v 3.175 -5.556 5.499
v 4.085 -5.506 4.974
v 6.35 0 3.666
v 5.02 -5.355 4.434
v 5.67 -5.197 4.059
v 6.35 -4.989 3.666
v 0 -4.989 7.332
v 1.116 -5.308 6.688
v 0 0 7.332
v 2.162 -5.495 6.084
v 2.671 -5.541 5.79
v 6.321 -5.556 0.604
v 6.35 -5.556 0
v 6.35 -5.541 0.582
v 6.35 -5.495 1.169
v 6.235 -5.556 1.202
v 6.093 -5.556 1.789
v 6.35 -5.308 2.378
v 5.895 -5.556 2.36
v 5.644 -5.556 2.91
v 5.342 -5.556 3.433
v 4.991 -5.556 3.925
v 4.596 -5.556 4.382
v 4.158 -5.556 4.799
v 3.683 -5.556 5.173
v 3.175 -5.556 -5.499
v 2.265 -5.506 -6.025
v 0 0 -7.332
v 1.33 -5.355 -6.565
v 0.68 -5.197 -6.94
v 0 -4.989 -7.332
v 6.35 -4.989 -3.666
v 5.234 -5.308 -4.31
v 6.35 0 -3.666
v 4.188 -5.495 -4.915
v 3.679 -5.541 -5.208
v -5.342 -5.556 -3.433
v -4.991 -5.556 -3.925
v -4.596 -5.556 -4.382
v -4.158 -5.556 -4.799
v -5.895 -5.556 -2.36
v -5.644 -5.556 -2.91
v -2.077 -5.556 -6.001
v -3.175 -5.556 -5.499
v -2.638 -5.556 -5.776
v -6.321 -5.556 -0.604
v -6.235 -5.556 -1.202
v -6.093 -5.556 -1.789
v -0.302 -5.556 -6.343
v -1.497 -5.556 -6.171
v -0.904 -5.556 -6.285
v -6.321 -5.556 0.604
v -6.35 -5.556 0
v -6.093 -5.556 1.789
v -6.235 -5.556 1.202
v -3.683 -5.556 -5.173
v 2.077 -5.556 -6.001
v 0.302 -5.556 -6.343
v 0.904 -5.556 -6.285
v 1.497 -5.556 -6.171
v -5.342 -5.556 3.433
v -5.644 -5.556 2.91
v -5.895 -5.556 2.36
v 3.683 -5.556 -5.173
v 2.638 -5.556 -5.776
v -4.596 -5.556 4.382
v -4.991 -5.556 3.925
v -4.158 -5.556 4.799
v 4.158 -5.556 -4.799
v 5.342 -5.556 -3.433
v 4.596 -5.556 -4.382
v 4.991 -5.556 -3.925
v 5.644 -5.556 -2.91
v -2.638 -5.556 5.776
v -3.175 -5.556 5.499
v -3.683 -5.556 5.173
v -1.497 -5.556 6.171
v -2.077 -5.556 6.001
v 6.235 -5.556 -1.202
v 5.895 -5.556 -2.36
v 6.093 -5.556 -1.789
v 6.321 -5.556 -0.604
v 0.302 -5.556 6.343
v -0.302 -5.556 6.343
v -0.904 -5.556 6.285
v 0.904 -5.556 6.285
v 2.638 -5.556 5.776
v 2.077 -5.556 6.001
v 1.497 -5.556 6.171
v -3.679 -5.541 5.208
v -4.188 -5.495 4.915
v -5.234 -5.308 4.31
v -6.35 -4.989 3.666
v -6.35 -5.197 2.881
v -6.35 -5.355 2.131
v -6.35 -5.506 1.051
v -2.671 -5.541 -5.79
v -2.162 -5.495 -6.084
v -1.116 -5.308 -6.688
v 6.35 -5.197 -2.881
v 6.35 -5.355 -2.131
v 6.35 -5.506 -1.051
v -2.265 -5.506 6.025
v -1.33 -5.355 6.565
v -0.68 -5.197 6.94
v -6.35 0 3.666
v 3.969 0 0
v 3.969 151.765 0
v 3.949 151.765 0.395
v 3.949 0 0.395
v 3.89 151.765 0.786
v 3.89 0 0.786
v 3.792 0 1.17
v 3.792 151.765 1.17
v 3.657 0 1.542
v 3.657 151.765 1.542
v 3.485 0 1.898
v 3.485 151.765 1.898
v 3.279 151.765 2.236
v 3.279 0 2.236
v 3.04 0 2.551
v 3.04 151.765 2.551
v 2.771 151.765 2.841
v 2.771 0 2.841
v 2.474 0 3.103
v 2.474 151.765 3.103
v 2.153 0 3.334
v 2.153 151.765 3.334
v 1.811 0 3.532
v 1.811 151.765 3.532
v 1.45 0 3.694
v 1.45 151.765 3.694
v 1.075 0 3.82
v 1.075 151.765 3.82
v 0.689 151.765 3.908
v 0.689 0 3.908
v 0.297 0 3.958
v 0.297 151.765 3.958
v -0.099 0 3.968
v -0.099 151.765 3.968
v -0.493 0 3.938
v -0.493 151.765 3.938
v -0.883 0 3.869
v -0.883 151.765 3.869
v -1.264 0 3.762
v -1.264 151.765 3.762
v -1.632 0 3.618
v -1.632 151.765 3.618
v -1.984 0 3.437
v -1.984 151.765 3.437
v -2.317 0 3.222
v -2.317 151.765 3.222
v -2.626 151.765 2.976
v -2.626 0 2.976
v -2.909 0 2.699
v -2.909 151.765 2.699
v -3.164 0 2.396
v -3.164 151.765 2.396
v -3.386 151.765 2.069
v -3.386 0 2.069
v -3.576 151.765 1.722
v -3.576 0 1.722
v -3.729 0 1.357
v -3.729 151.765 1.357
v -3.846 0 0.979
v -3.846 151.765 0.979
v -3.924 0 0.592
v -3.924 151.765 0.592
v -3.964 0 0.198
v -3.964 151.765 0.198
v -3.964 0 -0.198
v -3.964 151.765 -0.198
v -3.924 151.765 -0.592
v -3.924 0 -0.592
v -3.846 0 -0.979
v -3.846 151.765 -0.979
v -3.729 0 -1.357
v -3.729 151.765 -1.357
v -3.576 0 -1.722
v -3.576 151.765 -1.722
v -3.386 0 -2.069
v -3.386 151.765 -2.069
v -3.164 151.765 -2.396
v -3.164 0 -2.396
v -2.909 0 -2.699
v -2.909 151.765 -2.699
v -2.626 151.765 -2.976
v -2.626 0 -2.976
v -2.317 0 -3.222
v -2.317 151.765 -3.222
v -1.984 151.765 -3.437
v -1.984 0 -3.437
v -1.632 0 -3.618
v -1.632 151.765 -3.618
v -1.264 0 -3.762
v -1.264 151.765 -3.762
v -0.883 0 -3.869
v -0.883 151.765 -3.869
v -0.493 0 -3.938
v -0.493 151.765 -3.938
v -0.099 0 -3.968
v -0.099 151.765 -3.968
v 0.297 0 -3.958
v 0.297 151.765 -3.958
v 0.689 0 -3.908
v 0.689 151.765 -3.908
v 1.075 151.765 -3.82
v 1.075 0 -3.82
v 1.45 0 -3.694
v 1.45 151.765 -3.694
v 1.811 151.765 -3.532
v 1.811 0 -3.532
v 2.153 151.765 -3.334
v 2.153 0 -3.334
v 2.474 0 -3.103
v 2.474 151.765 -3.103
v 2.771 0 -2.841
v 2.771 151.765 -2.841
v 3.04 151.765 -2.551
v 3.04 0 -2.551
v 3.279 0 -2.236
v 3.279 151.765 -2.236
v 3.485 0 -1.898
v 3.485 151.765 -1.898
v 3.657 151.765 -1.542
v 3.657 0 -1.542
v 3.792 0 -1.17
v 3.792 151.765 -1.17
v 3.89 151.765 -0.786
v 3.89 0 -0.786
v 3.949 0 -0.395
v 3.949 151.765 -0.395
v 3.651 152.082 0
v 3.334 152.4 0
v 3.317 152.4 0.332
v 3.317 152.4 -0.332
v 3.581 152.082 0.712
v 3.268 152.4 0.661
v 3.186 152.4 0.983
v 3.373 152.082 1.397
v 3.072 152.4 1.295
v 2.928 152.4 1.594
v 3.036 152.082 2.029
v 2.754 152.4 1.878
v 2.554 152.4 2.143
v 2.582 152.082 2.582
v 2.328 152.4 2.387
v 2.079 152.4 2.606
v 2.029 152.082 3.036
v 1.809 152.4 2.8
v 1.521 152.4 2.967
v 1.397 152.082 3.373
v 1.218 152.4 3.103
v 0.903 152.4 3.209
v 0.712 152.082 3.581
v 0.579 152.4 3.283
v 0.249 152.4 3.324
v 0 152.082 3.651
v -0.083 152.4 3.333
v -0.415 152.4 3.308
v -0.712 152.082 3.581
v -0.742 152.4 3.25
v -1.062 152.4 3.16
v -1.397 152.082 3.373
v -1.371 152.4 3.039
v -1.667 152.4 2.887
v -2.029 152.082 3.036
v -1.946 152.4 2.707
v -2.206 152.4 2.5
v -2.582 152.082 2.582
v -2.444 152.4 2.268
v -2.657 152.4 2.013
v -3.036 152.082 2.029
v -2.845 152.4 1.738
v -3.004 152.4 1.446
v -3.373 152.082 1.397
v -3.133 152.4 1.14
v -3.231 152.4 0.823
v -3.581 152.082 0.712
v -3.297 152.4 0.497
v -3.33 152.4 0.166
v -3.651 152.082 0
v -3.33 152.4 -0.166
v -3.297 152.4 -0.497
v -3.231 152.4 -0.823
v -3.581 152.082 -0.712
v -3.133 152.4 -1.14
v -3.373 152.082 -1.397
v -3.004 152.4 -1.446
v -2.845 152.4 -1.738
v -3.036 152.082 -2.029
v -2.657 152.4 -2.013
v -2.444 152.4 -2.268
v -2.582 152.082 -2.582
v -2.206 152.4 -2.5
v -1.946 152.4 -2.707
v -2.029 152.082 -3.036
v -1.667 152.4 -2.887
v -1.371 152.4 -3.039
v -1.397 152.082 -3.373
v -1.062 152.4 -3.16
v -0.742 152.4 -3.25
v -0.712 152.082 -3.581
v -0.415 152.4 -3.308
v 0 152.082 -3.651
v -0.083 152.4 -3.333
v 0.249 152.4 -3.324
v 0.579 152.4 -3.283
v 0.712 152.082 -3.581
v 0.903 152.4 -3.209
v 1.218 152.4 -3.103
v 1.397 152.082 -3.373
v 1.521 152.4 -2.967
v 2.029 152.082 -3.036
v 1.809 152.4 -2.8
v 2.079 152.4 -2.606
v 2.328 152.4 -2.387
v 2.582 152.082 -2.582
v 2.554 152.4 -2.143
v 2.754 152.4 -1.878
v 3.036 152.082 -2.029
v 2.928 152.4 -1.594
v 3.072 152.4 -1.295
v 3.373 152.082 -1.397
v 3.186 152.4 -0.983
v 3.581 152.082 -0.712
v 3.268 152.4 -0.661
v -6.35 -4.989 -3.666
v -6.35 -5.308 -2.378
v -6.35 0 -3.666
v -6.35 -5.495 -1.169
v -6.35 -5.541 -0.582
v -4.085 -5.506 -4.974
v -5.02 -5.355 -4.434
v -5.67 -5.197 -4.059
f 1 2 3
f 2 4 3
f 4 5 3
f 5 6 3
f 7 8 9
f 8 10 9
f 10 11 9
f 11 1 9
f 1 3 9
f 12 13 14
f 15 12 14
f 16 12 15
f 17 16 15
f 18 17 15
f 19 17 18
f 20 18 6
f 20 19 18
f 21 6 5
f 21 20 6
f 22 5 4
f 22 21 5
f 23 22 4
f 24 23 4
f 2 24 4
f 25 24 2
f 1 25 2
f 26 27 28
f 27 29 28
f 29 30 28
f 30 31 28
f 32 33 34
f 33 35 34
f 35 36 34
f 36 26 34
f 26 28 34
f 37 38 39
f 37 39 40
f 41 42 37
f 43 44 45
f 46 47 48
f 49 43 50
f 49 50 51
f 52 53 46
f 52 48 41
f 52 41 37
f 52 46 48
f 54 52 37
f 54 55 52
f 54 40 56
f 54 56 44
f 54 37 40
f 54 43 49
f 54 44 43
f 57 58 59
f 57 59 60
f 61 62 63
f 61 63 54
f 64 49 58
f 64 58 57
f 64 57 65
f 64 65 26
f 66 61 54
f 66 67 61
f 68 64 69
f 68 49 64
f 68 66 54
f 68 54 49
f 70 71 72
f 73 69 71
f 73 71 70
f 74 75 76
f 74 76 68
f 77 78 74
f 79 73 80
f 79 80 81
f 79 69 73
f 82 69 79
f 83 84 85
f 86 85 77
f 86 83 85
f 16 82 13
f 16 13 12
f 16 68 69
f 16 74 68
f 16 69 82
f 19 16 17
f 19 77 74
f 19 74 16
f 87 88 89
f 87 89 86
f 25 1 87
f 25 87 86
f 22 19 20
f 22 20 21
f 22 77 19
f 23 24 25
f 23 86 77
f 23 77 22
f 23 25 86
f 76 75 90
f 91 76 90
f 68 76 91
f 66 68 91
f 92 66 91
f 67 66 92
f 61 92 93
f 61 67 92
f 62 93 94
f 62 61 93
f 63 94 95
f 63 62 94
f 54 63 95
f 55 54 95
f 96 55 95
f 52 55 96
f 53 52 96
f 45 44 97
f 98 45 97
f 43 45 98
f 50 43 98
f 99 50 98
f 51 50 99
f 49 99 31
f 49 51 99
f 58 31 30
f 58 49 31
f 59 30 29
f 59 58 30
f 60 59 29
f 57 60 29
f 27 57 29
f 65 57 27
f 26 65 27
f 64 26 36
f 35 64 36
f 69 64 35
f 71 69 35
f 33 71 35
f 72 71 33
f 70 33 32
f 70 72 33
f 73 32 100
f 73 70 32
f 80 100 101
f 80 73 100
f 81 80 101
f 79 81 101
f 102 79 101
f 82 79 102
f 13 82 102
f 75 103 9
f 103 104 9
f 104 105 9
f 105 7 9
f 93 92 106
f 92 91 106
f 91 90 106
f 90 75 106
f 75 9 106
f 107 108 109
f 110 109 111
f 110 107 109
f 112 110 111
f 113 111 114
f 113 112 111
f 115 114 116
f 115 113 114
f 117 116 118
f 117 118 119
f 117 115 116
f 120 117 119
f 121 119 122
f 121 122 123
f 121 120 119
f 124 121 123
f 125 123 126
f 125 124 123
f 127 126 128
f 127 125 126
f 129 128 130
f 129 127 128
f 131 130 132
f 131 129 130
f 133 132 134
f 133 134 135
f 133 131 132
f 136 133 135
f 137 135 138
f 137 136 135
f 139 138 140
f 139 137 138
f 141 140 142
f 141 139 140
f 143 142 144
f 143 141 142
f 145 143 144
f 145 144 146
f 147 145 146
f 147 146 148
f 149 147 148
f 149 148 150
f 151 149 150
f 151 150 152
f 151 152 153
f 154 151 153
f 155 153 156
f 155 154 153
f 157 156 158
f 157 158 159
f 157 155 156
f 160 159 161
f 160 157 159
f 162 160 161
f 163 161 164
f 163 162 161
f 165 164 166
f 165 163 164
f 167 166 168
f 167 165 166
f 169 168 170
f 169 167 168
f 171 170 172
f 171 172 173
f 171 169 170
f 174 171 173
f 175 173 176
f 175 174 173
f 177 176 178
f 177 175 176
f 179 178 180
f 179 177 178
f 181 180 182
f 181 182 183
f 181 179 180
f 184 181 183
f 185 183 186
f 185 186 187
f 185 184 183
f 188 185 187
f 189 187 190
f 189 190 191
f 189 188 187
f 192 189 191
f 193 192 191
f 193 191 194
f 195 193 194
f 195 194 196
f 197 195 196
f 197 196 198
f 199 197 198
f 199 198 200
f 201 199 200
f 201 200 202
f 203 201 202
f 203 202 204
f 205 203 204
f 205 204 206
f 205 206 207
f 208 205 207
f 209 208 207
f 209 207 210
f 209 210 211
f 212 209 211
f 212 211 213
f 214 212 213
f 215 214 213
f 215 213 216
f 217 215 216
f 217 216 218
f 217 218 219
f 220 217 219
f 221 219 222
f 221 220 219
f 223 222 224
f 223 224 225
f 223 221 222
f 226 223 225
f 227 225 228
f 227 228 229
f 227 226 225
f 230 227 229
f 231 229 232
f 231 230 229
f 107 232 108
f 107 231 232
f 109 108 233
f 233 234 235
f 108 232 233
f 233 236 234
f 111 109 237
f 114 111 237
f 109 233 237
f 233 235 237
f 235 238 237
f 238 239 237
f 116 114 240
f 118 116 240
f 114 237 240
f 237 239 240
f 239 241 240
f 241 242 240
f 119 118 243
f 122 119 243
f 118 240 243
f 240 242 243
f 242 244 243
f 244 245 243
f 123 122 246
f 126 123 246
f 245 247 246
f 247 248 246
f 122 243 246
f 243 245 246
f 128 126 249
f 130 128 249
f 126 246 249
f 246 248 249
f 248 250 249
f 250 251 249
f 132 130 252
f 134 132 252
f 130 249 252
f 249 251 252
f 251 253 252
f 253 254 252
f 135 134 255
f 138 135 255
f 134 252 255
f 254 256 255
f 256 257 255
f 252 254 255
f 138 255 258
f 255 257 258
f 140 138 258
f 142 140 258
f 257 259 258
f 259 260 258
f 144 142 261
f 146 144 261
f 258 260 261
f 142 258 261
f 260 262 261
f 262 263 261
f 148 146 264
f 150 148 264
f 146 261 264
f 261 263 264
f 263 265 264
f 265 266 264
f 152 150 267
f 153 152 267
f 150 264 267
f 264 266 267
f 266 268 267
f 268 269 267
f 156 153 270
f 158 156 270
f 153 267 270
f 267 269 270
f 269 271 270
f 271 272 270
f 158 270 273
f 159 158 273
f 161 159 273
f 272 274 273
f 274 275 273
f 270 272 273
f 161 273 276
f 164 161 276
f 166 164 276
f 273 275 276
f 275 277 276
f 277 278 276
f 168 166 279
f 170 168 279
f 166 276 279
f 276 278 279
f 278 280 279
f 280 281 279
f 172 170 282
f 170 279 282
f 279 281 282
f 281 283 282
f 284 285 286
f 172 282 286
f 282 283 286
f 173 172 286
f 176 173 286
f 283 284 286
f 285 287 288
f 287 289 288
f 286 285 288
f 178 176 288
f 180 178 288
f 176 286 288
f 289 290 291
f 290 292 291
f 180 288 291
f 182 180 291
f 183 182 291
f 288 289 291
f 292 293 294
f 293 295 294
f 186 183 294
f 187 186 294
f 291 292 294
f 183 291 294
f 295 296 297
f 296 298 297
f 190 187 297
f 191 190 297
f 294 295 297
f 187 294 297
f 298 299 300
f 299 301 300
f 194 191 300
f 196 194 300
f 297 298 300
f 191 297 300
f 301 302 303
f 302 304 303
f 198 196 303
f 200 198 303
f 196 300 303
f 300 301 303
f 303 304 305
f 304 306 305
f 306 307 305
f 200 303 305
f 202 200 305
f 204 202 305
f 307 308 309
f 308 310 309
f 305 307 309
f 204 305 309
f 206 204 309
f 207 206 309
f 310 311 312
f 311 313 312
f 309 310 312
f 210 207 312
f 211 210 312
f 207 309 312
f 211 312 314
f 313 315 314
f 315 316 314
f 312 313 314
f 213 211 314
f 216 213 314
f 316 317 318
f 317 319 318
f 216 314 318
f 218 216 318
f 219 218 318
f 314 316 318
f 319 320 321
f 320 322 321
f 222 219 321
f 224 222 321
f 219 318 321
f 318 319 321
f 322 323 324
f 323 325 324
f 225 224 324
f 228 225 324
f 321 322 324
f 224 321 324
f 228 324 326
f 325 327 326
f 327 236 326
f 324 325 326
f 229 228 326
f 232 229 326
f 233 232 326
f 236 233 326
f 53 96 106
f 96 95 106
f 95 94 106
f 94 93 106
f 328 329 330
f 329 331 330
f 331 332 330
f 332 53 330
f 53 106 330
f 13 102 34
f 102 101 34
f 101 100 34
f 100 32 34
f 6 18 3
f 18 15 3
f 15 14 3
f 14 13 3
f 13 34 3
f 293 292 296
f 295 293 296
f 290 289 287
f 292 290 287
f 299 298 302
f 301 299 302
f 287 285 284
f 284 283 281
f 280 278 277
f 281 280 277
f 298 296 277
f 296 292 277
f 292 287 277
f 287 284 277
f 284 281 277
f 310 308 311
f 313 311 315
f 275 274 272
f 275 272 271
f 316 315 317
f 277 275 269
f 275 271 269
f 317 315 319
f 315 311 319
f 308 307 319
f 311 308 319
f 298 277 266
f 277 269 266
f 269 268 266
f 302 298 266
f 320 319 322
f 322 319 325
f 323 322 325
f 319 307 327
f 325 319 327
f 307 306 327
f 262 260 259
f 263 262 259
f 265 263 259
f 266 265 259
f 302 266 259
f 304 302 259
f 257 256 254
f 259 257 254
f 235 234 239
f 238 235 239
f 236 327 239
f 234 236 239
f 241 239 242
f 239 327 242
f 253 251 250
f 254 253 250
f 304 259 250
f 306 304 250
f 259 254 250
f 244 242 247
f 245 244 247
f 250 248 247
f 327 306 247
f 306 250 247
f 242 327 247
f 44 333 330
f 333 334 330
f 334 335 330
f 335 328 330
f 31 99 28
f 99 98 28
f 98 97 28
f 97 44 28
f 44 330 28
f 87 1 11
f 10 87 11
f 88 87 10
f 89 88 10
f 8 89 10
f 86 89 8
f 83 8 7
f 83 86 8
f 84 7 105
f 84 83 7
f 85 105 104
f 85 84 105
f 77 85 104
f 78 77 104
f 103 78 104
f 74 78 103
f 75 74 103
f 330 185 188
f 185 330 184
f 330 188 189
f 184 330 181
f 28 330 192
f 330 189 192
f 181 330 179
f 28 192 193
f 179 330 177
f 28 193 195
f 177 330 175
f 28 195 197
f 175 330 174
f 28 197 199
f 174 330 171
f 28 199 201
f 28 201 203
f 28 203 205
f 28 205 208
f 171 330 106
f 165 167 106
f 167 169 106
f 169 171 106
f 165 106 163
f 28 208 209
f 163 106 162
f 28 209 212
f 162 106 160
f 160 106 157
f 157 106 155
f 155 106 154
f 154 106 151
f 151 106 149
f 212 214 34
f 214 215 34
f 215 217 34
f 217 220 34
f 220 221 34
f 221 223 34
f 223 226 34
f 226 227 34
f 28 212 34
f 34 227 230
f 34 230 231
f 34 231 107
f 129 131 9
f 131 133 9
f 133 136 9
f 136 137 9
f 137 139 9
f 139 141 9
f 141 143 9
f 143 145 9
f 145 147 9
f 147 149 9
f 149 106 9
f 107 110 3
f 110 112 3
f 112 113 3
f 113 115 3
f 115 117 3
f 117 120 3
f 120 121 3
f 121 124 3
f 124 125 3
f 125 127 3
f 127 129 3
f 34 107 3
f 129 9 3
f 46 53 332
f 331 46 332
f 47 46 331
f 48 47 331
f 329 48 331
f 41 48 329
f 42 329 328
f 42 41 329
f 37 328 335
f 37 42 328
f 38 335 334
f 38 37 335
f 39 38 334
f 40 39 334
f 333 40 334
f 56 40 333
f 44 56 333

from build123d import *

# Parameters (mm, degrees)
F2_R     = 3.96875
F3_DEPTH = 152.4
F5_DEPTH = 5.55625
F6_SIZE  = 0.635


# Not quite as in the source:
# - a length typed as a fraction of an inch, garbled in the dataset ("3 / 203.2 mm" for 3/8 in), is restored


with BuildPart() as f3:
    # F2 (on Front) → F3 (new body)
    with BuildSketch(Plane.XZ):
        Circle(F2_R)
    extrude(amount=-F3_DEPTH)

    # F4 (on Front) → F5 (join)
    with BuildSketch(Plane.XZ):
        Polygon((0, -7.3323484187), (6.35, -3.6661742094), (6.35, 3.6661742094), (0, 7.3323484187), (-6.35, 3.6661742094), (-6.35, -3.6661742094), align=None)
    extrude(amount=F5_DEPTH)

    # F6
    f6_edges = [f3.edges().sort_by_distance(p)[0] for p in [
        (-3.96875, 152.4, 0),
    ]]
    chamfer(f6_edges, length=F6_SIZE)

    # F7 (on Top) → F8 (revolve, cut)
    with BuildSketch(Plane.XY):
        Polygon((13.4339599431, -5.55625), (13.4339599431, -1.4663238199), (6.35, -5.55625), align=None)
    revolve(axis=Axis((0, -2.778125, 0), (0, -1, 0)), mode=Mode.SUBTRACT)


solid = f3.part
